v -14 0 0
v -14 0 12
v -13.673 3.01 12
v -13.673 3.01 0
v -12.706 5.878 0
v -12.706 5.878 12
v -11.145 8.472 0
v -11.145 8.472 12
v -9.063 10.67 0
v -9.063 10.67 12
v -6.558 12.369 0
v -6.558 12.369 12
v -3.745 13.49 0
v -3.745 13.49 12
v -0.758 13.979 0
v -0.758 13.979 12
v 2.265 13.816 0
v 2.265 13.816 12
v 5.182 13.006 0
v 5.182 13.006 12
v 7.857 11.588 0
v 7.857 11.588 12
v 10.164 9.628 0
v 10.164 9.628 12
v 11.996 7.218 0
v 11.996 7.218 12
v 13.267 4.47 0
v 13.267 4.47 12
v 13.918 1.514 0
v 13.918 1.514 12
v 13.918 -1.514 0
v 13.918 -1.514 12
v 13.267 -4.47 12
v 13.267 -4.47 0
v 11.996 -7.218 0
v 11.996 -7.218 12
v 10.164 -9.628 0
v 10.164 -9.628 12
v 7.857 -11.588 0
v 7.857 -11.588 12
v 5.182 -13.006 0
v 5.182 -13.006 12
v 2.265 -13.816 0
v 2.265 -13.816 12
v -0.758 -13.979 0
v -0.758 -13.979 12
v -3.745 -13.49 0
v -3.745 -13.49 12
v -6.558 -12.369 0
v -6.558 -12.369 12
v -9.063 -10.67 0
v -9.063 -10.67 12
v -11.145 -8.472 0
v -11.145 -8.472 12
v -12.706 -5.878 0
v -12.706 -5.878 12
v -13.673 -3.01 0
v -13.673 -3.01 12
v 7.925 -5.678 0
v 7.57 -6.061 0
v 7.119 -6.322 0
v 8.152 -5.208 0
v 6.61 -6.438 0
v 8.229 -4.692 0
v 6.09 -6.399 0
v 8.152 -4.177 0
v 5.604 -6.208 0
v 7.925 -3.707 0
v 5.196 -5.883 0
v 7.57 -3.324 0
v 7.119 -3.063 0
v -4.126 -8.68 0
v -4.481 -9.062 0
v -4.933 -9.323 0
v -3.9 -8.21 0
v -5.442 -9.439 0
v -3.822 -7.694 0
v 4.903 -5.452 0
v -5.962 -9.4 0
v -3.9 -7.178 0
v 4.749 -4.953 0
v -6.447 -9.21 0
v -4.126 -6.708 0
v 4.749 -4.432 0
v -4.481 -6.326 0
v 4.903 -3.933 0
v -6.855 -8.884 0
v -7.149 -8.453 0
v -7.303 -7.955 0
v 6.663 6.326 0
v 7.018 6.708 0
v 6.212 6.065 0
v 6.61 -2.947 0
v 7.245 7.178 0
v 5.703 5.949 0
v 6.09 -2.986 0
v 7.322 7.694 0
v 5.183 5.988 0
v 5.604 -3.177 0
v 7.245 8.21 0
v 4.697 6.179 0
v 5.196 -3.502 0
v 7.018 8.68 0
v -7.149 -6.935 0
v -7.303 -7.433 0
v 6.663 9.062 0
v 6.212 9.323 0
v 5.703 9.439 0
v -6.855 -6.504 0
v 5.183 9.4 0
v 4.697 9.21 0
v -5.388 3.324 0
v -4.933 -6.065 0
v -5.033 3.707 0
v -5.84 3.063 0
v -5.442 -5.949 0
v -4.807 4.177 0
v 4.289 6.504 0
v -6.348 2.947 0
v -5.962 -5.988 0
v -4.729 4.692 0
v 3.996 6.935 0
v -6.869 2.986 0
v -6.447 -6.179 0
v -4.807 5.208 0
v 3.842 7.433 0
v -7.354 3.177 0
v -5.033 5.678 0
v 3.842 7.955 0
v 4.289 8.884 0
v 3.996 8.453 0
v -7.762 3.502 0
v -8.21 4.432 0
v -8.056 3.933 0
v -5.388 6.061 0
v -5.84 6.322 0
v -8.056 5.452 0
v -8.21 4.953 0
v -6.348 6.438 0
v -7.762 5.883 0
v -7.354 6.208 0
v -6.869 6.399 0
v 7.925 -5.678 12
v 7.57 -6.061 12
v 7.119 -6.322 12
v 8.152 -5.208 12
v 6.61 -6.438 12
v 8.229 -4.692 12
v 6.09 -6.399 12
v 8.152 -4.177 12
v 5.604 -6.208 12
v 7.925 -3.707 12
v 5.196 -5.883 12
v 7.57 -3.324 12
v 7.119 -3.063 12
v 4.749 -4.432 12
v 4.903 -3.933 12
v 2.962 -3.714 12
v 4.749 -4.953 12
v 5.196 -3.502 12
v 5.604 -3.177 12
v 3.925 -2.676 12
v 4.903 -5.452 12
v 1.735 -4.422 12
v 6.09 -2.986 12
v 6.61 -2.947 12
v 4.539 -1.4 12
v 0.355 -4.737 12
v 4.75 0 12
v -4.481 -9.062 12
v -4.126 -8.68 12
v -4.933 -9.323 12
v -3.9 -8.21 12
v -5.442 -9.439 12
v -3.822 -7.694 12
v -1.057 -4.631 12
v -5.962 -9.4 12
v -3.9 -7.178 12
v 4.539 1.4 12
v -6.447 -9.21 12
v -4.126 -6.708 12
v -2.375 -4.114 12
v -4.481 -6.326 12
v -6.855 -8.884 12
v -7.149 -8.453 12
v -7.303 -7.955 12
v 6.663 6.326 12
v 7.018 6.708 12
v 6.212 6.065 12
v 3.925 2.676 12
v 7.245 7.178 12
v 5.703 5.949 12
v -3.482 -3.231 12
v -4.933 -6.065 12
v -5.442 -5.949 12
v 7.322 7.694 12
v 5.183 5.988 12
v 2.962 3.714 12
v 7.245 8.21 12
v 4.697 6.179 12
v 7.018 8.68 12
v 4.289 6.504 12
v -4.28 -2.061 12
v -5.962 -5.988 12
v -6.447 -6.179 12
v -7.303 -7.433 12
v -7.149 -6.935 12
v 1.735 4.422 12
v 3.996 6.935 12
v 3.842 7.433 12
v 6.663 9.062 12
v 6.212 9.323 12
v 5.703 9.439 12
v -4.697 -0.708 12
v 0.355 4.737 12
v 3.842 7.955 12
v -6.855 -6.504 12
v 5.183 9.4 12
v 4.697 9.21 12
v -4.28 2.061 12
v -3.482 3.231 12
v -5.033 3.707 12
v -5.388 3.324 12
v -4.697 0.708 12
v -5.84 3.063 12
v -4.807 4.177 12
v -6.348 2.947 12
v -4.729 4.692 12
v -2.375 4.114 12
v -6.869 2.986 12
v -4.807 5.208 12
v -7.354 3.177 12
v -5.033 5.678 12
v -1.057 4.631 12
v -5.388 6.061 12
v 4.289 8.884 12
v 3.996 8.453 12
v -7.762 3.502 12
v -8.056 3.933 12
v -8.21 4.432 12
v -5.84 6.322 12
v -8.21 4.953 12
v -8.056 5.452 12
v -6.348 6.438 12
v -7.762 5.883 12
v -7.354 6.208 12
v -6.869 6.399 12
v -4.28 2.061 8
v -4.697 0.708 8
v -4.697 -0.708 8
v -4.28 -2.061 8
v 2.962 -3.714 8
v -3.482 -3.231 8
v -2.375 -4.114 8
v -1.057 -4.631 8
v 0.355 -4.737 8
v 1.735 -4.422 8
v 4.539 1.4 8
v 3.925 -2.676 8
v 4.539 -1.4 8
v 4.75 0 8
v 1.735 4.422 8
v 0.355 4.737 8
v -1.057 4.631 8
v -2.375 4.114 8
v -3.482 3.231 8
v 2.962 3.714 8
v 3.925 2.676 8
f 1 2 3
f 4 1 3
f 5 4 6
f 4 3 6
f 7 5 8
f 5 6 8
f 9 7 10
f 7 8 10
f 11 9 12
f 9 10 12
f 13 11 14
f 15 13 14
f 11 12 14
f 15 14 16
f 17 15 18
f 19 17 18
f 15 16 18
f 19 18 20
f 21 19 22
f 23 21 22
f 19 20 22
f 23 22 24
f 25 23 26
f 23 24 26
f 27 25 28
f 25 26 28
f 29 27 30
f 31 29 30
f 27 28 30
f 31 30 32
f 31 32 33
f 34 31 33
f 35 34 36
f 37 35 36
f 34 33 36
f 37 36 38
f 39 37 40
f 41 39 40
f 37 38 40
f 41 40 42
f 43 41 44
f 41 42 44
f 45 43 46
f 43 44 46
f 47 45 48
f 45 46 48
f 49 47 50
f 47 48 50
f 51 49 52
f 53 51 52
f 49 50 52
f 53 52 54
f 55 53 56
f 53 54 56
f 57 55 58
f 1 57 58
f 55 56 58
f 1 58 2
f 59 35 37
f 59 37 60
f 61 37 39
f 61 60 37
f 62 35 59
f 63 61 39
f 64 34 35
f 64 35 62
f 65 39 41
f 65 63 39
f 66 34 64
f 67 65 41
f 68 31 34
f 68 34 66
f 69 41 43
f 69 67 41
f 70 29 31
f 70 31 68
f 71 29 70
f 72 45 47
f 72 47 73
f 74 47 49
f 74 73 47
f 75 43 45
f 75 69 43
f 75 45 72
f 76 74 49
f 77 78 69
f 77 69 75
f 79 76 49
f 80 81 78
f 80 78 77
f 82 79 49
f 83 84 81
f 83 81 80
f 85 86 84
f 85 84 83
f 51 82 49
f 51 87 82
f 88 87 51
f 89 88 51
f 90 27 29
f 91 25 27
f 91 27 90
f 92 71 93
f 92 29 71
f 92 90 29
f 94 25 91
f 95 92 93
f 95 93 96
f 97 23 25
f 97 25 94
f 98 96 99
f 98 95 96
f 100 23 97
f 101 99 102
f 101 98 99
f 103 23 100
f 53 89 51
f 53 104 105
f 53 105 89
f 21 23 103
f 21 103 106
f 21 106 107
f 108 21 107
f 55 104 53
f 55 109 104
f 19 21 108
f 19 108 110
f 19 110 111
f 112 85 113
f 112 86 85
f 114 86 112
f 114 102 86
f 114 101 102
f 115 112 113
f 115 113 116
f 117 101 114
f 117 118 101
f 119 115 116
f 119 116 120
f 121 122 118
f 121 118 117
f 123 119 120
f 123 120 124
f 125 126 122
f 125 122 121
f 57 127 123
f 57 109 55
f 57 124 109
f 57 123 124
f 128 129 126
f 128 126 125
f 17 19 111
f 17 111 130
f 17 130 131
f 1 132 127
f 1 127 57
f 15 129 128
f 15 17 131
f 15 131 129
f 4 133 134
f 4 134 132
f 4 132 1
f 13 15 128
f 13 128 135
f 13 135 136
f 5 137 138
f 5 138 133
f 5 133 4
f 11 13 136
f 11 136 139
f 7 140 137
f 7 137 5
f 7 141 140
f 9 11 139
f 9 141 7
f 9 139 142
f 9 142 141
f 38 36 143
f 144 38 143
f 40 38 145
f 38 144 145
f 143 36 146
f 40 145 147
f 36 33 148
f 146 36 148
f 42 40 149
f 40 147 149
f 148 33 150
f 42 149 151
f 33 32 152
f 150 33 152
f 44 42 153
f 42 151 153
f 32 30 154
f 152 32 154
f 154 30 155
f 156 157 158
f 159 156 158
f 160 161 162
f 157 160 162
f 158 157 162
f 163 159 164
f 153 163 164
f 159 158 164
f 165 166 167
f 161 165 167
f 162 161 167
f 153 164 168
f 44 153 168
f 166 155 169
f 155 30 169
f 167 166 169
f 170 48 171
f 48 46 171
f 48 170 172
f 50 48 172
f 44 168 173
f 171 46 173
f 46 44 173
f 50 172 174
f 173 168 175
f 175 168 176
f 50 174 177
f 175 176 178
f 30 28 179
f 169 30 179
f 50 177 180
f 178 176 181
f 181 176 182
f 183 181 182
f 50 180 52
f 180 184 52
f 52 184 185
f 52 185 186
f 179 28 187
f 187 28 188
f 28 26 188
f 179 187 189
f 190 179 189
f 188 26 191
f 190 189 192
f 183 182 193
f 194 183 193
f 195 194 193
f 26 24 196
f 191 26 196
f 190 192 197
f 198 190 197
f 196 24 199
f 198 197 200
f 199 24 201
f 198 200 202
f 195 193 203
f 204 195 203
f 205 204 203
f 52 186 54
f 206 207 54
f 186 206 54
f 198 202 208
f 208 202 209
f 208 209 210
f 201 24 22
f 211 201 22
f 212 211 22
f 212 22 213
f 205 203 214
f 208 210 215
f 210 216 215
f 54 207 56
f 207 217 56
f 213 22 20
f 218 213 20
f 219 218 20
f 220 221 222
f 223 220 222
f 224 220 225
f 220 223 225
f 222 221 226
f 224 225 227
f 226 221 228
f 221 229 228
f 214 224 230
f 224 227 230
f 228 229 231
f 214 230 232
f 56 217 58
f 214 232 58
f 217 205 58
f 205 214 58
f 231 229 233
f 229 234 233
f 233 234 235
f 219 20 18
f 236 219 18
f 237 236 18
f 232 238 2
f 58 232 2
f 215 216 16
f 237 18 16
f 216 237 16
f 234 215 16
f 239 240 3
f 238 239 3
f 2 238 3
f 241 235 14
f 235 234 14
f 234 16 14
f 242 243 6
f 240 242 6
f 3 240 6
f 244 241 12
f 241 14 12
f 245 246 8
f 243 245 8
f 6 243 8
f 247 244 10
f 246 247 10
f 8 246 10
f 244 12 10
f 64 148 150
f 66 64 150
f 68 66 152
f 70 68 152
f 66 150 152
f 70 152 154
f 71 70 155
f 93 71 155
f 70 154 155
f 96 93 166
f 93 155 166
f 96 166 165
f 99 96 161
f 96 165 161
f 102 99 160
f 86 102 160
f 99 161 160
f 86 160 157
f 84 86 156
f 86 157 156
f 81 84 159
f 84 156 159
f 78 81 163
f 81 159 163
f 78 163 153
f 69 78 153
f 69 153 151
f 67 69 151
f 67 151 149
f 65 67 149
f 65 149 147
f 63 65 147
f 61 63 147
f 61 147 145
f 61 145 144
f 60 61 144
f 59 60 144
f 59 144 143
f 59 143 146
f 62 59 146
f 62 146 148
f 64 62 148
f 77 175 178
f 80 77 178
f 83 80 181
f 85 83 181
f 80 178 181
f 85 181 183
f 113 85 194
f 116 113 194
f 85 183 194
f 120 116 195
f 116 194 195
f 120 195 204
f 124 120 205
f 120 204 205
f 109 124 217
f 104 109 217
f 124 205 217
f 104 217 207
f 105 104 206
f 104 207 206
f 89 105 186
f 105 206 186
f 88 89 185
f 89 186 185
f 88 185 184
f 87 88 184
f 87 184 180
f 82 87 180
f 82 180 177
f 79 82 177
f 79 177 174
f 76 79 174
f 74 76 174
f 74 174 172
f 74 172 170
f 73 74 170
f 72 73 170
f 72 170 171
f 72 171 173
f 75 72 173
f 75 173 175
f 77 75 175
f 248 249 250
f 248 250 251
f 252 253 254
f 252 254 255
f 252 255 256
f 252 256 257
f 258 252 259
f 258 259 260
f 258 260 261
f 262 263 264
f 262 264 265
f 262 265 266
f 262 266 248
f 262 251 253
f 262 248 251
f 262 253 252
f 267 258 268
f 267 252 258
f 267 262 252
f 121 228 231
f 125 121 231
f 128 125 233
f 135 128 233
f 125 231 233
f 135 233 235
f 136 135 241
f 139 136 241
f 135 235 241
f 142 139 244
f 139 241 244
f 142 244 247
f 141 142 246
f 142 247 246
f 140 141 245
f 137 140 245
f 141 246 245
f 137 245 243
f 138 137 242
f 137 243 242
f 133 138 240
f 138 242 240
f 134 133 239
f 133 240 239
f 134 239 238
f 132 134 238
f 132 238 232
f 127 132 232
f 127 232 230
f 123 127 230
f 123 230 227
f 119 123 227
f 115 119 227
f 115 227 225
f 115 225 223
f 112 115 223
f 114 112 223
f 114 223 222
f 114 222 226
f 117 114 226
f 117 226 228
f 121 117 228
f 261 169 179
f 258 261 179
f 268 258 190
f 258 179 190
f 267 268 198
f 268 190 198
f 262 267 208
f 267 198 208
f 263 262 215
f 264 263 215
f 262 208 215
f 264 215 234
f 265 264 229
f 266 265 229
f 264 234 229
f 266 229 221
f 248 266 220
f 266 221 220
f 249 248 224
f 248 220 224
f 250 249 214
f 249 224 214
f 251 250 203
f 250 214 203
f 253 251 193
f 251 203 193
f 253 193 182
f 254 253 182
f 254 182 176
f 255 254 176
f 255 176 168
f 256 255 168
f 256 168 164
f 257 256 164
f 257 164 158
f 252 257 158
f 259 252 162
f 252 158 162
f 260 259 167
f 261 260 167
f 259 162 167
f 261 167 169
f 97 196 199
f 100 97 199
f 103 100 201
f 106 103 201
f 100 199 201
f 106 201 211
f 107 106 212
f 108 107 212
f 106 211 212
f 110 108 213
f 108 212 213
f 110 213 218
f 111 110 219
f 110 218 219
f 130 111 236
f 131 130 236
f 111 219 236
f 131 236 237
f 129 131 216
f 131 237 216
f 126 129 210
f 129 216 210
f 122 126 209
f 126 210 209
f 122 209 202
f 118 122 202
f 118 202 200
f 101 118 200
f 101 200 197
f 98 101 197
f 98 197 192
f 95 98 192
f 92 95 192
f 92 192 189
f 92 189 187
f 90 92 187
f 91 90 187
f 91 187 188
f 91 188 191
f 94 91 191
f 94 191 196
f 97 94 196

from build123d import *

# Parameters (mm, degrees)
SKETCH2_R           = 14
BOSS_EXTRUDE1_DEPTH = 12
SKETCH3_R           = 1.75
CUT_EXTRUDE1_DEPTH  = 13
SKETCH4_R           = 4.75
CUT_EXTRUDE2_DEPTH  = 4


with BuildPart() as part:
    # Sketch2 → Boss-Extrude1 (new body)
    with BuildSketch(Plane(origin=(0, 0, 12), x_dir=(-1, 0, 0), z_dir=(0, 0, -1))):
        Circle(SKETCH2_R)
    extrude(amount=BOSS_EXTRUDE1_DEPTH)

    # Sketch3 → Cut-Extrude1 (cut, through all)
    with BuildSketch(Plane.XY.offset(12)):
        with Locations((-6.479247663, 4.692477993)):
            Circle(SKETCH3_R)
        with Locations((5.572317617, 7.6941066)):
            Circle(SKETCH3_R)
        with Locations((6.479247663, -4.692477993)):
            Circle(SKETCH3_R)
        with Locations((-5.572317617, -7.6941066)):
            Circle(SKETCH3_R)
    extrude(amount=-CUT_EXTRUDE1_DEPTH, mode=Mode.SUBTRACT)

    # Sketch4 → Cut-Extrude2 (cut)
    with BuildSketch(Plane.XY.offset(12)):
        Circle(SKETCH4_R)
    extrude(amount=-CUT_EXTRUDE2_DEPTH, mode=Mode.SUBTRACT)


solid = part.part
